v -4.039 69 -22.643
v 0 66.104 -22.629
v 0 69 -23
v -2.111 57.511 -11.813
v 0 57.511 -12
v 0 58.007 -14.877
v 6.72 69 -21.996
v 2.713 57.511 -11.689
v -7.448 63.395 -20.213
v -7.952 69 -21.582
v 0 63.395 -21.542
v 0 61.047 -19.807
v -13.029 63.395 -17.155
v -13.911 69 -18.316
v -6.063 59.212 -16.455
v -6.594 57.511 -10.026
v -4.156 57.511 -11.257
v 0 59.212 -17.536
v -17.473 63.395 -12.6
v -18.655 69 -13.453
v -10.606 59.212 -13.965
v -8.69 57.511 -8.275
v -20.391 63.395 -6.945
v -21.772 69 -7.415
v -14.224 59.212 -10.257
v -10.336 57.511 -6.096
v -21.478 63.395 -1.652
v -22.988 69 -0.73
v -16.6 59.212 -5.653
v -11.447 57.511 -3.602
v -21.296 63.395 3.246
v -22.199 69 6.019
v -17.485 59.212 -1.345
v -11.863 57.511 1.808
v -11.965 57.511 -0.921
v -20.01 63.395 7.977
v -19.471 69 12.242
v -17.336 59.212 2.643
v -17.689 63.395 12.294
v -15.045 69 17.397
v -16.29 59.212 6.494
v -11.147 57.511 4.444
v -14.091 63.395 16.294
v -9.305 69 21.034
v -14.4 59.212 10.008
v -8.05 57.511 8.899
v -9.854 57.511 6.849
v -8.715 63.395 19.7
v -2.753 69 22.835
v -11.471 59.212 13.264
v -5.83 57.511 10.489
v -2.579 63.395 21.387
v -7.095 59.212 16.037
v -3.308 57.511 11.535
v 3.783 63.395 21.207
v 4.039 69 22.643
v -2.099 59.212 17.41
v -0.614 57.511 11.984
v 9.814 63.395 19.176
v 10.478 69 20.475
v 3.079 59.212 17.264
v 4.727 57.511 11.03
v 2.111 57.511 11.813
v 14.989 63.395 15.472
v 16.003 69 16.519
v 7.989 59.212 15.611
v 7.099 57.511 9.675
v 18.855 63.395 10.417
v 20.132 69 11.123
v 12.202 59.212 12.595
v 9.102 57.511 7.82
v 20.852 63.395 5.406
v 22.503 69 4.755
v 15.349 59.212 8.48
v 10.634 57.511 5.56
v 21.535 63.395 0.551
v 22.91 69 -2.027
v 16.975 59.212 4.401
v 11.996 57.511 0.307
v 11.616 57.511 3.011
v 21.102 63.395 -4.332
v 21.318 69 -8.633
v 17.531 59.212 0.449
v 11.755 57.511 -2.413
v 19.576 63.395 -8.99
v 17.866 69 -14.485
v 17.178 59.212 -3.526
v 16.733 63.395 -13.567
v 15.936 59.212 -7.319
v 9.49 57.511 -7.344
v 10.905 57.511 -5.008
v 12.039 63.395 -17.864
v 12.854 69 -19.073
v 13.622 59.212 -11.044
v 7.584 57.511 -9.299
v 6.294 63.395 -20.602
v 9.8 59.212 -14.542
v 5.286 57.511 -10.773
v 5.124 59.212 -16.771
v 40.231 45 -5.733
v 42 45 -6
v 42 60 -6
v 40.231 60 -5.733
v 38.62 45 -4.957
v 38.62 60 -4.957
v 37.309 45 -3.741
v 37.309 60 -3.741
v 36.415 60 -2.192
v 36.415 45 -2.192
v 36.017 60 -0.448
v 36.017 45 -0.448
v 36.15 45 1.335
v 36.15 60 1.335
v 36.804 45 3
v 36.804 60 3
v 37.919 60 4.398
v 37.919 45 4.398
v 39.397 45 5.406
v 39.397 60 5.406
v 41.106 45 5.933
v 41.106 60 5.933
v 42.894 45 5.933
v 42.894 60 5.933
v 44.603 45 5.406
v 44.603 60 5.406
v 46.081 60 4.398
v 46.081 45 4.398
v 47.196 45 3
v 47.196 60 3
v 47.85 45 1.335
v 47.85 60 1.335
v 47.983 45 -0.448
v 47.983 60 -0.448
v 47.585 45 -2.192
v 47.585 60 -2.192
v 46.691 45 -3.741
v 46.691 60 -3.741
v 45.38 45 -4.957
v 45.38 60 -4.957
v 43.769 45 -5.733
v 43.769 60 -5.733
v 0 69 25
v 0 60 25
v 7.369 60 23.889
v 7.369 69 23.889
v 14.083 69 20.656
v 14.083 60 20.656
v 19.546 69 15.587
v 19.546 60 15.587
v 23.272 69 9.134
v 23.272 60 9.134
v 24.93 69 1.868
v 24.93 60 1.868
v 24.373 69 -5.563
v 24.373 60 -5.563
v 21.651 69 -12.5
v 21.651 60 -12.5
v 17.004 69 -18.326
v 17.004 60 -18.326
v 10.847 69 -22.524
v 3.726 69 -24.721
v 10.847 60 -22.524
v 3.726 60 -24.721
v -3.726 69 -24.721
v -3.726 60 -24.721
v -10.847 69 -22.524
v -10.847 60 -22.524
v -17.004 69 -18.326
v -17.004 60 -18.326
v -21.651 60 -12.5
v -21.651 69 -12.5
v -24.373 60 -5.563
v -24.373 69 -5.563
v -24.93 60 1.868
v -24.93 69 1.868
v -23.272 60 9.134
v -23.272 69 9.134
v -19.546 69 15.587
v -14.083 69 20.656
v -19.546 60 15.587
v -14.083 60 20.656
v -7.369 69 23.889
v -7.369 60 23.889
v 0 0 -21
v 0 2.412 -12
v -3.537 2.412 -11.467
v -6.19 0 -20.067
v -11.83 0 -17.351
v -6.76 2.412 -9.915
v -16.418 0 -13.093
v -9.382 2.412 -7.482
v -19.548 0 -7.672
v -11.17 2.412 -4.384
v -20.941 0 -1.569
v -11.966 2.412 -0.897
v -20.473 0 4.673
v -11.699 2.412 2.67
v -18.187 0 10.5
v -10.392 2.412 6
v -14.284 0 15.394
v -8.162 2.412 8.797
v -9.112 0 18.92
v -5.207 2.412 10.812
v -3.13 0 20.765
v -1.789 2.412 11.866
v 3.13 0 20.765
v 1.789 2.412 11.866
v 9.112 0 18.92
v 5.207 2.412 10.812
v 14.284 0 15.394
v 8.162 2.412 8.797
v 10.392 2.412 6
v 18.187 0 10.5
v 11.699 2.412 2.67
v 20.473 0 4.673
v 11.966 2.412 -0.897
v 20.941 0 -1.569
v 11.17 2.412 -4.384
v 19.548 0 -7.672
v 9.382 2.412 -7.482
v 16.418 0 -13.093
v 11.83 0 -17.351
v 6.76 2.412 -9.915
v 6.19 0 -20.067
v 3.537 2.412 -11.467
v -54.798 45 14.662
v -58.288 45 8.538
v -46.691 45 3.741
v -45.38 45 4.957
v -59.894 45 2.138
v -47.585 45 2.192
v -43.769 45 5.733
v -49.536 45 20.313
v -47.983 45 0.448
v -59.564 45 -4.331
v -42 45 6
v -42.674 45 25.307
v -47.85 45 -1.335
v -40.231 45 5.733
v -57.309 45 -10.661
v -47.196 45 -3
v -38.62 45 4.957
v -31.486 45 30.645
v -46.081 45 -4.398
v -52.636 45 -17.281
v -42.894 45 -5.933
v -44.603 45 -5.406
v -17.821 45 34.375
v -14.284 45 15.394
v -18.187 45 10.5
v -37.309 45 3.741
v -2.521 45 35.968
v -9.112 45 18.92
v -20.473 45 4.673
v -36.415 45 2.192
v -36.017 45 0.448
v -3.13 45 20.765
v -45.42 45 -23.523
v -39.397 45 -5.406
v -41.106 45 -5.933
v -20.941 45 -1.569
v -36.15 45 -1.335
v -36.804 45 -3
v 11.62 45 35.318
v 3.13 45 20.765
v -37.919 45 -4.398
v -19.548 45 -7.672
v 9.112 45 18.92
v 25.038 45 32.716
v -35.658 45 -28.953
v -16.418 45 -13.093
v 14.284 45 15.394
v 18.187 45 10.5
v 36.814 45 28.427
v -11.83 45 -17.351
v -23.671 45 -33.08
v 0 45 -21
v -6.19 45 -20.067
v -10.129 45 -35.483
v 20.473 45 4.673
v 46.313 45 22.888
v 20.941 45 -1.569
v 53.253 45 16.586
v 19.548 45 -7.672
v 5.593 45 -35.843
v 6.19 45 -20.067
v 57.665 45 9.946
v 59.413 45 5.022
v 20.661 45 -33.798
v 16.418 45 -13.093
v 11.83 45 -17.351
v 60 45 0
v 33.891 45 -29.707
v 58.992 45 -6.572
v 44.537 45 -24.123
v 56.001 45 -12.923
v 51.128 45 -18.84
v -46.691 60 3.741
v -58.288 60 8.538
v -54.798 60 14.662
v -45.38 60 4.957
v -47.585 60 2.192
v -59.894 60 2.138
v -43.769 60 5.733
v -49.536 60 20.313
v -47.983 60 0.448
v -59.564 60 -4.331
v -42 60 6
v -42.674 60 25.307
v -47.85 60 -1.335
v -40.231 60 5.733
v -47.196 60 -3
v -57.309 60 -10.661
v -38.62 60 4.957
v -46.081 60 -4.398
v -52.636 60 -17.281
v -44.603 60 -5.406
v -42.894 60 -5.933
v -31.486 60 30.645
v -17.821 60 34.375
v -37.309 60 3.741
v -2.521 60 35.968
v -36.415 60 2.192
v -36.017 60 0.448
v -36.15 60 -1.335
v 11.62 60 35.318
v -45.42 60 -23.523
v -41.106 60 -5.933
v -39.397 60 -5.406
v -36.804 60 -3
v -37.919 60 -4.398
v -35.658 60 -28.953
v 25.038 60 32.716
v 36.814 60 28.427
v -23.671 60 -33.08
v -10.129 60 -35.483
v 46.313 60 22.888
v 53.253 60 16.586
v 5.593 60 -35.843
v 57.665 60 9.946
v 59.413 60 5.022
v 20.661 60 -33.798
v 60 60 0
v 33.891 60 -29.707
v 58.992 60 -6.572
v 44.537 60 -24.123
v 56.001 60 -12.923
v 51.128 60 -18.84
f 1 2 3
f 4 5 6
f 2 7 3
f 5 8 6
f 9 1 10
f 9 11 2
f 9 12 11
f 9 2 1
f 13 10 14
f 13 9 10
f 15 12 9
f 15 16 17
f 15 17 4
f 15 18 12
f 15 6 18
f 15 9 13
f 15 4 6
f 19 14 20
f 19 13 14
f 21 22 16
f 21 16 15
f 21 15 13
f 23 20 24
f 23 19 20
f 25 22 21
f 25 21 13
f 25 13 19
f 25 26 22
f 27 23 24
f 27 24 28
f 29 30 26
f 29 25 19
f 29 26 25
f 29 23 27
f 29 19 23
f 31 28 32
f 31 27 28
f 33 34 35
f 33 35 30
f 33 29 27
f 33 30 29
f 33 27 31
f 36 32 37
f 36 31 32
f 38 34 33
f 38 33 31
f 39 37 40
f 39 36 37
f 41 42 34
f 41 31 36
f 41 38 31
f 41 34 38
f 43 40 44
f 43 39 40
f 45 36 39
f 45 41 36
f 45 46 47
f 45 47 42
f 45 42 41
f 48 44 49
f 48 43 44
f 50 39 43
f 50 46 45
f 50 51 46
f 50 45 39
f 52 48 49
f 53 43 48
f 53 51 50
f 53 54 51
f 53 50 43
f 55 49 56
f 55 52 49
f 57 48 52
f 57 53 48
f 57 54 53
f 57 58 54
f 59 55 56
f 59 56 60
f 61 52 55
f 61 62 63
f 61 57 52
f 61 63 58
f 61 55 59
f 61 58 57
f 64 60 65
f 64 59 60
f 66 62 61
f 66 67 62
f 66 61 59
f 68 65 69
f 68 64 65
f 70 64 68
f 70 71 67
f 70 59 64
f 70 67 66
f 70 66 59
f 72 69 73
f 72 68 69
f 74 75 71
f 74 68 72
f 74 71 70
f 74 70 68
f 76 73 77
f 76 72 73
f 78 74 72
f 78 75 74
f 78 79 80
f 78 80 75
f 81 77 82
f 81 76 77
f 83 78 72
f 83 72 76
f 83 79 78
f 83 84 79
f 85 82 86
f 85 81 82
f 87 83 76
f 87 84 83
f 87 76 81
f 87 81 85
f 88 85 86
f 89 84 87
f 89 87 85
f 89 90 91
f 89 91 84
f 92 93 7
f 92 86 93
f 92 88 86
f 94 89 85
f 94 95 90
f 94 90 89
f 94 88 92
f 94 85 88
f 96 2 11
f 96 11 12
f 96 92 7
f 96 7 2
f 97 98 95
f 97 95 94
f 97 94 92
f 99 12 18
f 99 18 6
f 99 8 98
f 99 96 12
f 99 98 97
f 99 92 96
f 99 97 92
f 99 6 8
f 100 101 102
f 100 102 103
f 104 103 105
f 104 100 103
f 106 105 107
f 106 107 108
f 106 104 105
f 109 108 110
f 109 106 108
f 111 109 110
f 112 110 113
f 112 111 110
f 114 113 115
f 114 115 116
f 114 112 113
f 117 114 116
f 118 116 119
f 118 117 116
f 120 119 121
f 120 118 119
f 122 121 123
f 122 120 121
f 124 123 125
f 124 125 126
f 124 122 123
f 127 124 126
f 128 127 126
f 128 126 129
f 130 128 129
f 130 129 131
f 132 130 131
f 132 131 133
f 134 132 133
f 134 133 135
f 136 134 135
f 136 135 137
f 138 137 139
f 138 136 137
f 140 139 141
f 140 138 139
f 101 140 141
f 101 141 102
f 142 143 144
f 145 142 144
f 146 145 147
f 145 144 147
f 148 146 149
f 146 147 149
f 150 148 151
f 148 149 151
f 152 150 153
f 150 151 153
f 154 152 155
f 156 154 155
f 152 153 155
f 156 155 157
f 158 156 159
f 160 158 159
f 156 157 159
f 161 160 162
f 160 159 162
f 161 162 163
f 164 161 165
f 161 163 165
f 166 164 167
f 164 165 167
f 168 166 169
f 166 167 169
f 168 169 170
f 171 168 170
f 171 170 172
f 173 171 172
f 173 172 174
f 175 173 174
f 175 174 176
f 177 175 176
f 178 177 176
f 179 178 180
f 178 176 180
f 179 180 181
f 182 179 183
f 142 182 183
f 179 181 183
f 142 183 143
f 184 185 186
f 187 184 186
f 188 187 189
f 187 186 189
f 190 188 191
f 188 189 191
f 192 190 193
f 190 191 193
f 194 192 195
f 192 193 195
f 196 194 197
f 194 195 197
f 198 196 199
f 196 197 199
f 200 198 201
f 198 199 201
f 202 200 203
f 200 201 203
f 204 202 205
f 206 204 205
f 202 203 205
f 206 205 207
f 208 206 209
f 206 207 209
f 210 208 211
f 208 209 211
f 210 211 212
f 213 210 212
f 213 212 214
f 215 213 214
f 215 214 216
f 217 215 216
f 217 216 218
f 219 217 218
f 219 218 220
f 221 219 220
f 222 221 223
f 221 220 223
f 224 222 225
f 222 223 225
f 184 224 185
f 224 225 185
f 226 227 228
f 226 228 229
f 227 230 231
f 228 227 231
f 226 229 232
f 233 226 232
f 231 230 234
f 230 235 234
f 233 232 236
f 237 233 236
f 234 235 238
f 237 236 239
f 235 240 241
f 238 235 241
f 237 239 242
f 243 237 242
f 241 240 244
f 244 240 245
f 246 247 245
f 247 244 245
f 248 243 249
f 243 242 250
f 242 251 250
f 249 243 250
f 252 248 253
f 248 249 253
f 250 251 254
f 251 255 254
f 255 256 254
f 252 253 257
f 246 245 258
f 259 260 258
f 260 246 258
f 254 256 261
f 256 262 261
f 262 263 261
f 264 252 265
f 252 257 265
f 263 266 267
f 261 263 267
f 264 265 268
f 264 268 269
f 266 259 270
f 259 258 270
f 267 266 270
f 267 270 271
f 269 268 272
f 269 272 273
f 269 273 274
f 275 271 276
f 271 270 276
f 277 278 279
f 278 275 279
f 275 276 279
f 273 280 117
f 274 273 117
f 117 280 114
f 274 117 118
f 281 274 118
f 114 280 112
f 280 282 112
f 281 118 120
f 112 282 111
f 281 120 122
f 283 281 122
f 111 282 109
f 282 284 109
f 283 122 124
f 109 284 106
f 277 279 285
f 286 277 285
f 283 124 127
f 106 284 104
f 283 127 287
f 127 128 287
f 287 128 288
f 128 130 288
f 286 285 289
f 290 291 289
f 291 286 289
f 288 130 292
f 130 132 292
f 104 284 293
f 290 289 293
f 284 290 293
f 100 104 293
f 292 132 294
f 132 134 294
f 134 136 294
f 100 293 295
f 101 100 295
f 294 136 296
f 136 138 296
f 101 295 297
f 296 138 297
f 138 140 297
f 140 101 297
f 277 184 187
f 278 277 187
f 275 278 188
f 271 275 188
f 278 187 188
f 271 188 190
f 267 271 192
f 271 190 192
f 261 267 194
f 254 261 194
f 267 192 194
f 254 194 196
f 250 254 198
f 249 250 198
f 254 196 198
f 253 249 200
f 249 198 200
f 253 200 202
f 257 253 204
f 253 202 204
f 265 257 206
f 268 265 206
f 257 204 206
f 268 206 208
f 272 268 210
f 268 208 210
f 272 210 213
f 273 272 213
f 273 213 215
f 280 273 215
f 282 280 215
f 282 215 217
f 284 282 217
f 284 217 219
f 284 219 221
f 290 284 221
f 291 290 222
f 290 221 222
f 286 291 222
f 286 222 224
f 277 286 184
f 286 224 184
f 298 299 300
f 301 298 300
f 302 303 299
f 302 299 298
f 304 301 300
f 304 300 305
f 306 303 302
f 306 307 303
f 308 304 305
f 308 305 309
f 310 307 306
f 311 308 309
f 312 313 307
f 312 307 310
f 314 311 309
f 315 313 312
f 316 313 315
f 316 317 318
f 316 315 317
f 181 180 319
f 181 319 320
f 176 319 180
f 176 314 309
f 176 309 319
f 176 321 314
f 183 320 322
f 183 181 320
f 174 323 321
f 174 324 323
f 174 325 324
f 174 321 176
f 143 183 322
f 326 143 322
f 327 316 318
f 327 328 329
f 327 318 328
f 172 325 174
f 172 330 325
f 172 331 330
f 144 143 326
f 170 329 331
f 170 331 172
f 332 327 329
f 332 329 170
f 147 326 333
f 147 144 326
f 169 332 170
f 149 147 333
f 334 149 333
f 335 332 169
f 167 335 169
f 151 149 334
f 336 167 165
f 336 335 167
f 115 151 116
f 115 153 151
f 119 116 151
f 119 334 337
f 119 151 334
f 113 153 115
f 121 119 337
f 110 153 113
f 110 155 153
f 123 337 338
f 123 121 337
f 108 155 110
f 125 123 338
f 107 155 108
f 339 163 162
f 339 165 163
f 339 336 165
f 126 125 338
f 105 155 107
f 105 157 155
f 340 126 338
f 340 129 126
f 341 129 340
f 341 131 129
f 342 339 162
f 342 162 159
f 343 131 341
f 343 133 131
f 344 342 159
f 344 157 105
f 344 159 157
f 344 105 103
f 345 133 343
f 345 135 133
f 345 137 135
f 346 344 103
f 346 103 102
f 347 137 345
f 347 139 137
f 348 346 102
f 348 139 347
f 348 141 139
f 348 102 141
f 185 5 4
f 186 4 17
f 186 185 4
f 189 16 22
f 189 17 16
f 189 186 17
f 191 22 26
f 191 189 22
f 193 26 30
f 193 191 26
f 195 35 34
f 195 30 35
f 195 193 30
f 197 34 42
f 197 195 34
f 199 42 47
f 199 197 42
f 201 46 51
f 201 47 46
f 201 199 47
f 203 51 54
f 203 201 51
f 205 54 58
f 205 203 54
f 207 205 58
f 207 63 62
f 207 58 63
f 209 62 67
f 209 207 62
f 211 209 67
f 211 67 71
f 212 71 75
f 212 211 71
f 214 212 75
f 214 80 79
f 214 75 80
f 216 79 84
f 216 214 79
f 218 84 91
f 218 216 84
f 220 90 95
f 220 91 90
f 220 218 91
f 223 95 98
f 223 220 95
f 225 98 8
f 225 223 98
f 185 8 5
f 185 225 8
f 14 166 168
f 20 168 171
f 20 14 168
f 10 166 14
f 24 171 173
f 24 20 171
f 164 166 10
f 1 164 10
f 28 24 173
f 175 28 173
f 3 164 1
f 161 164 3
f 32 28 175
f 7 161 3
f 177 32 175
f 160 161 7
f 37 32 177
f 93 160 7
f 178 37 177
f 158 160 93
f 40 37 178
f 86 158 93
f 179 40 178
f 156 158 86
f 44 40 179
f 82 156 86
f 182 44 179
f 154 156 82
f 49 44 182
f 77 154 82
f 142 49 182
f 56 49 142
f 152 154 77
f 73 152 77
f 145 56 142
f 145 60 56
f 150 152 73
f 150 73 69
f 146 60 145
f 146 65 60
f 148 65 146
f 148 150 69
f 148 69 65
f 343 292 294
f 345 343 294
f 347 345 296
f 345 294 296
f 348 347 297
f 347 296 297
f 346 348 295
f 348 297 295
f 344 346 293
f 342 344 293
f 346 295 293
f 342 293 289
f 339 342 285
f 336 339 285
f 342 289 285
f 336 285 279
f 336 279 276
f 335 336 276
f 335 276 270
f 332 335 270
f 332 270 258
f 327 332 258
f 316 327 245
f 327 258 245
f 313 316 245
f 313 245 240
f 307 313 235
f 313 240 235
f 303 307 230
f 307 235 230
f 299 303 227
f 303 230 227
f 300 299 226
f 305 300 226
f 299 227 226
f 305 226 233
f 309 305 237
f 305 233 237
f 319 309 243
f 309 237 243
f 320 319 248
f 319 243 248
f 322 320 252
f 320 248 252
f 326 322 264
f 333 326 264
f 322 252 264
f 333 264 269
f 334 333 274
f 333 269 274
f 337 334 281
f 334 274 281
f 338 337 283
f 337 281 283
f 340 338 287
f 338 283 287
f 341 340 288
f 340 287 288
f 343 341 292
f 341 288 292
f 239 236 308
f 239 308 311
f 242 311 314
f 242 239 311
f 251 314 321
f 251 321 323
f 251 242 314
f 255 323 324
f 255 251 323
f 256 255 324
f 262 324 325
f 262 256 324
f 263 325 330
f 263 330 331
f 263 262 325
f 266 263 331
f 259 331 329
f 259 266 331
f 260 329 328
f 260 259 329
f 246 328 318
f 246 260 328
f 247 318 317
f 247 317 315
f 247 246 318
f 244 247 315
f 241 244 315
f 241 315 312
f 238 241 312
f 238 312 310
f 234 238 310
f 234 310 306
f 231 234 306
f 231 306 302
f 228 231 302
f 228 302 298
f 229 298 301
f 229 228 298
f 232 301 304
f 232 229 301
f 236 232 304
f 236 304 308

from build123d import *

# Parameters (mm, degrees)
SKETCH1_R           = 21
SKETCH1_R_2         = 12
BOSS_EXTRUDE1_DEPTH = 45
SKETCH4_RX          = 60
SKETCH4_RY          = 36
SKETCH4_R           = 6
SKETCH4_R_2         = 12
BOSS_EXTRUDE2_DEPTH = 15
SKETCH5_R           = 25
BOSS_EXTRUDE3_DEPTH = 9


with BuildPart() as part:
    # Sketch1 → Boss-Extrude1 (new body)
    with BuildSketch(Plane(origin=(0, 0, 0), x_dir=(1, 0, 0), z_dir=(0, 1, 0))):
        with Locations(Location((0, 0, 0), (0, 0, 90))):
            Circle(SKETCH1_R)
        with Locations(Location((0, 0, 0), (0, 0, 90))):
            Circle(SKETCH1_R_2, mode=Mode.SUBTRACT)
    extrude(amount=BOSS_EXTRUDE1_DEPTH)

    # Sketch4 → Boss-Extrude2 (add)
    with BuildSketch(Plane(origin=(0, 45, 0), x_dir=(1, 0, 0), z_dir=(0, 1, 0))):
        with Locations((0, 0)):
            Ellipse(SKETCH4_RX, SKETCH4_RY)
        with Locations(Location((-42, 0, 0), (0, 0, 270))):
            Circle(SKETCH4_R, mode=Mode.SUBTRACT)
        with Locations(Location((42, 0, 0), (0, 0, 90))):
            Circle(SKETCH4_R, mode=Mode.SUBTRACT)
        with Locations(Location((0, 0, 0), (0, 0, 90))):
            Circle(SKETCH4_R_2, mode=Mode.SUBTRACT)
    extrude(amount=BOSS_EXTRUDE2_DEPTH)

    # Sketch5 → Boss-Extrude3 (add)
    with BuildSketch(Plane(origin=(0, 60, 0), x_dir=(1, 0, 0), z_dir=(0, 1, 0))):
        with Locations(Location((0, 0, 0), (0, 0, 270))):
            Circle(SKETCH5_R)
    extrude(amount=BOSS_EXTRUDE3_DEPTH)

    # Sketch6 → Cut-Revolve1 (revolve, cut)
    with BuildSketch(Plane.XY, mode=Mode.PRIVATE) as cut_revolve1_sk:
        with BuildLine():
            Line((-11.5, 57.5), (0, 57.5))
            Line((0, 57.5), (0, 80.5))
            Line((0, 80.5), (-11.5, 80.5))
            ThreePointArc((-11.5, 80.5), (-23, 69), (-11.5, 57.5))
        make_face()
    revolve(cut_revolve1_sk.sketch.rotate(Axis((0, 0, 0), (0, 1, 0)), 270), axis=Axis((0, 0, 0), (0, 1, 0)), mode=Mode.SUBTRACT)

    # Sketch7 → Cut-Revolve2 (revolve, cut)
    with BuildSketch(Plane.XY, mode=Mode.PRIVATE) as cut_revolve2_sk:
        Polygon((0, 0), (-21, 0), (0, 5.626933041), align=None)
    revolve(cut_revolve2_sk.sketch.rotate(Axis((0, 0, 0), (0, 1, 0)), 270), axis=Axis((0, 0, 0), (0, 1, 0)), mode=Mode.SUBTRACT)


solid = part.part
